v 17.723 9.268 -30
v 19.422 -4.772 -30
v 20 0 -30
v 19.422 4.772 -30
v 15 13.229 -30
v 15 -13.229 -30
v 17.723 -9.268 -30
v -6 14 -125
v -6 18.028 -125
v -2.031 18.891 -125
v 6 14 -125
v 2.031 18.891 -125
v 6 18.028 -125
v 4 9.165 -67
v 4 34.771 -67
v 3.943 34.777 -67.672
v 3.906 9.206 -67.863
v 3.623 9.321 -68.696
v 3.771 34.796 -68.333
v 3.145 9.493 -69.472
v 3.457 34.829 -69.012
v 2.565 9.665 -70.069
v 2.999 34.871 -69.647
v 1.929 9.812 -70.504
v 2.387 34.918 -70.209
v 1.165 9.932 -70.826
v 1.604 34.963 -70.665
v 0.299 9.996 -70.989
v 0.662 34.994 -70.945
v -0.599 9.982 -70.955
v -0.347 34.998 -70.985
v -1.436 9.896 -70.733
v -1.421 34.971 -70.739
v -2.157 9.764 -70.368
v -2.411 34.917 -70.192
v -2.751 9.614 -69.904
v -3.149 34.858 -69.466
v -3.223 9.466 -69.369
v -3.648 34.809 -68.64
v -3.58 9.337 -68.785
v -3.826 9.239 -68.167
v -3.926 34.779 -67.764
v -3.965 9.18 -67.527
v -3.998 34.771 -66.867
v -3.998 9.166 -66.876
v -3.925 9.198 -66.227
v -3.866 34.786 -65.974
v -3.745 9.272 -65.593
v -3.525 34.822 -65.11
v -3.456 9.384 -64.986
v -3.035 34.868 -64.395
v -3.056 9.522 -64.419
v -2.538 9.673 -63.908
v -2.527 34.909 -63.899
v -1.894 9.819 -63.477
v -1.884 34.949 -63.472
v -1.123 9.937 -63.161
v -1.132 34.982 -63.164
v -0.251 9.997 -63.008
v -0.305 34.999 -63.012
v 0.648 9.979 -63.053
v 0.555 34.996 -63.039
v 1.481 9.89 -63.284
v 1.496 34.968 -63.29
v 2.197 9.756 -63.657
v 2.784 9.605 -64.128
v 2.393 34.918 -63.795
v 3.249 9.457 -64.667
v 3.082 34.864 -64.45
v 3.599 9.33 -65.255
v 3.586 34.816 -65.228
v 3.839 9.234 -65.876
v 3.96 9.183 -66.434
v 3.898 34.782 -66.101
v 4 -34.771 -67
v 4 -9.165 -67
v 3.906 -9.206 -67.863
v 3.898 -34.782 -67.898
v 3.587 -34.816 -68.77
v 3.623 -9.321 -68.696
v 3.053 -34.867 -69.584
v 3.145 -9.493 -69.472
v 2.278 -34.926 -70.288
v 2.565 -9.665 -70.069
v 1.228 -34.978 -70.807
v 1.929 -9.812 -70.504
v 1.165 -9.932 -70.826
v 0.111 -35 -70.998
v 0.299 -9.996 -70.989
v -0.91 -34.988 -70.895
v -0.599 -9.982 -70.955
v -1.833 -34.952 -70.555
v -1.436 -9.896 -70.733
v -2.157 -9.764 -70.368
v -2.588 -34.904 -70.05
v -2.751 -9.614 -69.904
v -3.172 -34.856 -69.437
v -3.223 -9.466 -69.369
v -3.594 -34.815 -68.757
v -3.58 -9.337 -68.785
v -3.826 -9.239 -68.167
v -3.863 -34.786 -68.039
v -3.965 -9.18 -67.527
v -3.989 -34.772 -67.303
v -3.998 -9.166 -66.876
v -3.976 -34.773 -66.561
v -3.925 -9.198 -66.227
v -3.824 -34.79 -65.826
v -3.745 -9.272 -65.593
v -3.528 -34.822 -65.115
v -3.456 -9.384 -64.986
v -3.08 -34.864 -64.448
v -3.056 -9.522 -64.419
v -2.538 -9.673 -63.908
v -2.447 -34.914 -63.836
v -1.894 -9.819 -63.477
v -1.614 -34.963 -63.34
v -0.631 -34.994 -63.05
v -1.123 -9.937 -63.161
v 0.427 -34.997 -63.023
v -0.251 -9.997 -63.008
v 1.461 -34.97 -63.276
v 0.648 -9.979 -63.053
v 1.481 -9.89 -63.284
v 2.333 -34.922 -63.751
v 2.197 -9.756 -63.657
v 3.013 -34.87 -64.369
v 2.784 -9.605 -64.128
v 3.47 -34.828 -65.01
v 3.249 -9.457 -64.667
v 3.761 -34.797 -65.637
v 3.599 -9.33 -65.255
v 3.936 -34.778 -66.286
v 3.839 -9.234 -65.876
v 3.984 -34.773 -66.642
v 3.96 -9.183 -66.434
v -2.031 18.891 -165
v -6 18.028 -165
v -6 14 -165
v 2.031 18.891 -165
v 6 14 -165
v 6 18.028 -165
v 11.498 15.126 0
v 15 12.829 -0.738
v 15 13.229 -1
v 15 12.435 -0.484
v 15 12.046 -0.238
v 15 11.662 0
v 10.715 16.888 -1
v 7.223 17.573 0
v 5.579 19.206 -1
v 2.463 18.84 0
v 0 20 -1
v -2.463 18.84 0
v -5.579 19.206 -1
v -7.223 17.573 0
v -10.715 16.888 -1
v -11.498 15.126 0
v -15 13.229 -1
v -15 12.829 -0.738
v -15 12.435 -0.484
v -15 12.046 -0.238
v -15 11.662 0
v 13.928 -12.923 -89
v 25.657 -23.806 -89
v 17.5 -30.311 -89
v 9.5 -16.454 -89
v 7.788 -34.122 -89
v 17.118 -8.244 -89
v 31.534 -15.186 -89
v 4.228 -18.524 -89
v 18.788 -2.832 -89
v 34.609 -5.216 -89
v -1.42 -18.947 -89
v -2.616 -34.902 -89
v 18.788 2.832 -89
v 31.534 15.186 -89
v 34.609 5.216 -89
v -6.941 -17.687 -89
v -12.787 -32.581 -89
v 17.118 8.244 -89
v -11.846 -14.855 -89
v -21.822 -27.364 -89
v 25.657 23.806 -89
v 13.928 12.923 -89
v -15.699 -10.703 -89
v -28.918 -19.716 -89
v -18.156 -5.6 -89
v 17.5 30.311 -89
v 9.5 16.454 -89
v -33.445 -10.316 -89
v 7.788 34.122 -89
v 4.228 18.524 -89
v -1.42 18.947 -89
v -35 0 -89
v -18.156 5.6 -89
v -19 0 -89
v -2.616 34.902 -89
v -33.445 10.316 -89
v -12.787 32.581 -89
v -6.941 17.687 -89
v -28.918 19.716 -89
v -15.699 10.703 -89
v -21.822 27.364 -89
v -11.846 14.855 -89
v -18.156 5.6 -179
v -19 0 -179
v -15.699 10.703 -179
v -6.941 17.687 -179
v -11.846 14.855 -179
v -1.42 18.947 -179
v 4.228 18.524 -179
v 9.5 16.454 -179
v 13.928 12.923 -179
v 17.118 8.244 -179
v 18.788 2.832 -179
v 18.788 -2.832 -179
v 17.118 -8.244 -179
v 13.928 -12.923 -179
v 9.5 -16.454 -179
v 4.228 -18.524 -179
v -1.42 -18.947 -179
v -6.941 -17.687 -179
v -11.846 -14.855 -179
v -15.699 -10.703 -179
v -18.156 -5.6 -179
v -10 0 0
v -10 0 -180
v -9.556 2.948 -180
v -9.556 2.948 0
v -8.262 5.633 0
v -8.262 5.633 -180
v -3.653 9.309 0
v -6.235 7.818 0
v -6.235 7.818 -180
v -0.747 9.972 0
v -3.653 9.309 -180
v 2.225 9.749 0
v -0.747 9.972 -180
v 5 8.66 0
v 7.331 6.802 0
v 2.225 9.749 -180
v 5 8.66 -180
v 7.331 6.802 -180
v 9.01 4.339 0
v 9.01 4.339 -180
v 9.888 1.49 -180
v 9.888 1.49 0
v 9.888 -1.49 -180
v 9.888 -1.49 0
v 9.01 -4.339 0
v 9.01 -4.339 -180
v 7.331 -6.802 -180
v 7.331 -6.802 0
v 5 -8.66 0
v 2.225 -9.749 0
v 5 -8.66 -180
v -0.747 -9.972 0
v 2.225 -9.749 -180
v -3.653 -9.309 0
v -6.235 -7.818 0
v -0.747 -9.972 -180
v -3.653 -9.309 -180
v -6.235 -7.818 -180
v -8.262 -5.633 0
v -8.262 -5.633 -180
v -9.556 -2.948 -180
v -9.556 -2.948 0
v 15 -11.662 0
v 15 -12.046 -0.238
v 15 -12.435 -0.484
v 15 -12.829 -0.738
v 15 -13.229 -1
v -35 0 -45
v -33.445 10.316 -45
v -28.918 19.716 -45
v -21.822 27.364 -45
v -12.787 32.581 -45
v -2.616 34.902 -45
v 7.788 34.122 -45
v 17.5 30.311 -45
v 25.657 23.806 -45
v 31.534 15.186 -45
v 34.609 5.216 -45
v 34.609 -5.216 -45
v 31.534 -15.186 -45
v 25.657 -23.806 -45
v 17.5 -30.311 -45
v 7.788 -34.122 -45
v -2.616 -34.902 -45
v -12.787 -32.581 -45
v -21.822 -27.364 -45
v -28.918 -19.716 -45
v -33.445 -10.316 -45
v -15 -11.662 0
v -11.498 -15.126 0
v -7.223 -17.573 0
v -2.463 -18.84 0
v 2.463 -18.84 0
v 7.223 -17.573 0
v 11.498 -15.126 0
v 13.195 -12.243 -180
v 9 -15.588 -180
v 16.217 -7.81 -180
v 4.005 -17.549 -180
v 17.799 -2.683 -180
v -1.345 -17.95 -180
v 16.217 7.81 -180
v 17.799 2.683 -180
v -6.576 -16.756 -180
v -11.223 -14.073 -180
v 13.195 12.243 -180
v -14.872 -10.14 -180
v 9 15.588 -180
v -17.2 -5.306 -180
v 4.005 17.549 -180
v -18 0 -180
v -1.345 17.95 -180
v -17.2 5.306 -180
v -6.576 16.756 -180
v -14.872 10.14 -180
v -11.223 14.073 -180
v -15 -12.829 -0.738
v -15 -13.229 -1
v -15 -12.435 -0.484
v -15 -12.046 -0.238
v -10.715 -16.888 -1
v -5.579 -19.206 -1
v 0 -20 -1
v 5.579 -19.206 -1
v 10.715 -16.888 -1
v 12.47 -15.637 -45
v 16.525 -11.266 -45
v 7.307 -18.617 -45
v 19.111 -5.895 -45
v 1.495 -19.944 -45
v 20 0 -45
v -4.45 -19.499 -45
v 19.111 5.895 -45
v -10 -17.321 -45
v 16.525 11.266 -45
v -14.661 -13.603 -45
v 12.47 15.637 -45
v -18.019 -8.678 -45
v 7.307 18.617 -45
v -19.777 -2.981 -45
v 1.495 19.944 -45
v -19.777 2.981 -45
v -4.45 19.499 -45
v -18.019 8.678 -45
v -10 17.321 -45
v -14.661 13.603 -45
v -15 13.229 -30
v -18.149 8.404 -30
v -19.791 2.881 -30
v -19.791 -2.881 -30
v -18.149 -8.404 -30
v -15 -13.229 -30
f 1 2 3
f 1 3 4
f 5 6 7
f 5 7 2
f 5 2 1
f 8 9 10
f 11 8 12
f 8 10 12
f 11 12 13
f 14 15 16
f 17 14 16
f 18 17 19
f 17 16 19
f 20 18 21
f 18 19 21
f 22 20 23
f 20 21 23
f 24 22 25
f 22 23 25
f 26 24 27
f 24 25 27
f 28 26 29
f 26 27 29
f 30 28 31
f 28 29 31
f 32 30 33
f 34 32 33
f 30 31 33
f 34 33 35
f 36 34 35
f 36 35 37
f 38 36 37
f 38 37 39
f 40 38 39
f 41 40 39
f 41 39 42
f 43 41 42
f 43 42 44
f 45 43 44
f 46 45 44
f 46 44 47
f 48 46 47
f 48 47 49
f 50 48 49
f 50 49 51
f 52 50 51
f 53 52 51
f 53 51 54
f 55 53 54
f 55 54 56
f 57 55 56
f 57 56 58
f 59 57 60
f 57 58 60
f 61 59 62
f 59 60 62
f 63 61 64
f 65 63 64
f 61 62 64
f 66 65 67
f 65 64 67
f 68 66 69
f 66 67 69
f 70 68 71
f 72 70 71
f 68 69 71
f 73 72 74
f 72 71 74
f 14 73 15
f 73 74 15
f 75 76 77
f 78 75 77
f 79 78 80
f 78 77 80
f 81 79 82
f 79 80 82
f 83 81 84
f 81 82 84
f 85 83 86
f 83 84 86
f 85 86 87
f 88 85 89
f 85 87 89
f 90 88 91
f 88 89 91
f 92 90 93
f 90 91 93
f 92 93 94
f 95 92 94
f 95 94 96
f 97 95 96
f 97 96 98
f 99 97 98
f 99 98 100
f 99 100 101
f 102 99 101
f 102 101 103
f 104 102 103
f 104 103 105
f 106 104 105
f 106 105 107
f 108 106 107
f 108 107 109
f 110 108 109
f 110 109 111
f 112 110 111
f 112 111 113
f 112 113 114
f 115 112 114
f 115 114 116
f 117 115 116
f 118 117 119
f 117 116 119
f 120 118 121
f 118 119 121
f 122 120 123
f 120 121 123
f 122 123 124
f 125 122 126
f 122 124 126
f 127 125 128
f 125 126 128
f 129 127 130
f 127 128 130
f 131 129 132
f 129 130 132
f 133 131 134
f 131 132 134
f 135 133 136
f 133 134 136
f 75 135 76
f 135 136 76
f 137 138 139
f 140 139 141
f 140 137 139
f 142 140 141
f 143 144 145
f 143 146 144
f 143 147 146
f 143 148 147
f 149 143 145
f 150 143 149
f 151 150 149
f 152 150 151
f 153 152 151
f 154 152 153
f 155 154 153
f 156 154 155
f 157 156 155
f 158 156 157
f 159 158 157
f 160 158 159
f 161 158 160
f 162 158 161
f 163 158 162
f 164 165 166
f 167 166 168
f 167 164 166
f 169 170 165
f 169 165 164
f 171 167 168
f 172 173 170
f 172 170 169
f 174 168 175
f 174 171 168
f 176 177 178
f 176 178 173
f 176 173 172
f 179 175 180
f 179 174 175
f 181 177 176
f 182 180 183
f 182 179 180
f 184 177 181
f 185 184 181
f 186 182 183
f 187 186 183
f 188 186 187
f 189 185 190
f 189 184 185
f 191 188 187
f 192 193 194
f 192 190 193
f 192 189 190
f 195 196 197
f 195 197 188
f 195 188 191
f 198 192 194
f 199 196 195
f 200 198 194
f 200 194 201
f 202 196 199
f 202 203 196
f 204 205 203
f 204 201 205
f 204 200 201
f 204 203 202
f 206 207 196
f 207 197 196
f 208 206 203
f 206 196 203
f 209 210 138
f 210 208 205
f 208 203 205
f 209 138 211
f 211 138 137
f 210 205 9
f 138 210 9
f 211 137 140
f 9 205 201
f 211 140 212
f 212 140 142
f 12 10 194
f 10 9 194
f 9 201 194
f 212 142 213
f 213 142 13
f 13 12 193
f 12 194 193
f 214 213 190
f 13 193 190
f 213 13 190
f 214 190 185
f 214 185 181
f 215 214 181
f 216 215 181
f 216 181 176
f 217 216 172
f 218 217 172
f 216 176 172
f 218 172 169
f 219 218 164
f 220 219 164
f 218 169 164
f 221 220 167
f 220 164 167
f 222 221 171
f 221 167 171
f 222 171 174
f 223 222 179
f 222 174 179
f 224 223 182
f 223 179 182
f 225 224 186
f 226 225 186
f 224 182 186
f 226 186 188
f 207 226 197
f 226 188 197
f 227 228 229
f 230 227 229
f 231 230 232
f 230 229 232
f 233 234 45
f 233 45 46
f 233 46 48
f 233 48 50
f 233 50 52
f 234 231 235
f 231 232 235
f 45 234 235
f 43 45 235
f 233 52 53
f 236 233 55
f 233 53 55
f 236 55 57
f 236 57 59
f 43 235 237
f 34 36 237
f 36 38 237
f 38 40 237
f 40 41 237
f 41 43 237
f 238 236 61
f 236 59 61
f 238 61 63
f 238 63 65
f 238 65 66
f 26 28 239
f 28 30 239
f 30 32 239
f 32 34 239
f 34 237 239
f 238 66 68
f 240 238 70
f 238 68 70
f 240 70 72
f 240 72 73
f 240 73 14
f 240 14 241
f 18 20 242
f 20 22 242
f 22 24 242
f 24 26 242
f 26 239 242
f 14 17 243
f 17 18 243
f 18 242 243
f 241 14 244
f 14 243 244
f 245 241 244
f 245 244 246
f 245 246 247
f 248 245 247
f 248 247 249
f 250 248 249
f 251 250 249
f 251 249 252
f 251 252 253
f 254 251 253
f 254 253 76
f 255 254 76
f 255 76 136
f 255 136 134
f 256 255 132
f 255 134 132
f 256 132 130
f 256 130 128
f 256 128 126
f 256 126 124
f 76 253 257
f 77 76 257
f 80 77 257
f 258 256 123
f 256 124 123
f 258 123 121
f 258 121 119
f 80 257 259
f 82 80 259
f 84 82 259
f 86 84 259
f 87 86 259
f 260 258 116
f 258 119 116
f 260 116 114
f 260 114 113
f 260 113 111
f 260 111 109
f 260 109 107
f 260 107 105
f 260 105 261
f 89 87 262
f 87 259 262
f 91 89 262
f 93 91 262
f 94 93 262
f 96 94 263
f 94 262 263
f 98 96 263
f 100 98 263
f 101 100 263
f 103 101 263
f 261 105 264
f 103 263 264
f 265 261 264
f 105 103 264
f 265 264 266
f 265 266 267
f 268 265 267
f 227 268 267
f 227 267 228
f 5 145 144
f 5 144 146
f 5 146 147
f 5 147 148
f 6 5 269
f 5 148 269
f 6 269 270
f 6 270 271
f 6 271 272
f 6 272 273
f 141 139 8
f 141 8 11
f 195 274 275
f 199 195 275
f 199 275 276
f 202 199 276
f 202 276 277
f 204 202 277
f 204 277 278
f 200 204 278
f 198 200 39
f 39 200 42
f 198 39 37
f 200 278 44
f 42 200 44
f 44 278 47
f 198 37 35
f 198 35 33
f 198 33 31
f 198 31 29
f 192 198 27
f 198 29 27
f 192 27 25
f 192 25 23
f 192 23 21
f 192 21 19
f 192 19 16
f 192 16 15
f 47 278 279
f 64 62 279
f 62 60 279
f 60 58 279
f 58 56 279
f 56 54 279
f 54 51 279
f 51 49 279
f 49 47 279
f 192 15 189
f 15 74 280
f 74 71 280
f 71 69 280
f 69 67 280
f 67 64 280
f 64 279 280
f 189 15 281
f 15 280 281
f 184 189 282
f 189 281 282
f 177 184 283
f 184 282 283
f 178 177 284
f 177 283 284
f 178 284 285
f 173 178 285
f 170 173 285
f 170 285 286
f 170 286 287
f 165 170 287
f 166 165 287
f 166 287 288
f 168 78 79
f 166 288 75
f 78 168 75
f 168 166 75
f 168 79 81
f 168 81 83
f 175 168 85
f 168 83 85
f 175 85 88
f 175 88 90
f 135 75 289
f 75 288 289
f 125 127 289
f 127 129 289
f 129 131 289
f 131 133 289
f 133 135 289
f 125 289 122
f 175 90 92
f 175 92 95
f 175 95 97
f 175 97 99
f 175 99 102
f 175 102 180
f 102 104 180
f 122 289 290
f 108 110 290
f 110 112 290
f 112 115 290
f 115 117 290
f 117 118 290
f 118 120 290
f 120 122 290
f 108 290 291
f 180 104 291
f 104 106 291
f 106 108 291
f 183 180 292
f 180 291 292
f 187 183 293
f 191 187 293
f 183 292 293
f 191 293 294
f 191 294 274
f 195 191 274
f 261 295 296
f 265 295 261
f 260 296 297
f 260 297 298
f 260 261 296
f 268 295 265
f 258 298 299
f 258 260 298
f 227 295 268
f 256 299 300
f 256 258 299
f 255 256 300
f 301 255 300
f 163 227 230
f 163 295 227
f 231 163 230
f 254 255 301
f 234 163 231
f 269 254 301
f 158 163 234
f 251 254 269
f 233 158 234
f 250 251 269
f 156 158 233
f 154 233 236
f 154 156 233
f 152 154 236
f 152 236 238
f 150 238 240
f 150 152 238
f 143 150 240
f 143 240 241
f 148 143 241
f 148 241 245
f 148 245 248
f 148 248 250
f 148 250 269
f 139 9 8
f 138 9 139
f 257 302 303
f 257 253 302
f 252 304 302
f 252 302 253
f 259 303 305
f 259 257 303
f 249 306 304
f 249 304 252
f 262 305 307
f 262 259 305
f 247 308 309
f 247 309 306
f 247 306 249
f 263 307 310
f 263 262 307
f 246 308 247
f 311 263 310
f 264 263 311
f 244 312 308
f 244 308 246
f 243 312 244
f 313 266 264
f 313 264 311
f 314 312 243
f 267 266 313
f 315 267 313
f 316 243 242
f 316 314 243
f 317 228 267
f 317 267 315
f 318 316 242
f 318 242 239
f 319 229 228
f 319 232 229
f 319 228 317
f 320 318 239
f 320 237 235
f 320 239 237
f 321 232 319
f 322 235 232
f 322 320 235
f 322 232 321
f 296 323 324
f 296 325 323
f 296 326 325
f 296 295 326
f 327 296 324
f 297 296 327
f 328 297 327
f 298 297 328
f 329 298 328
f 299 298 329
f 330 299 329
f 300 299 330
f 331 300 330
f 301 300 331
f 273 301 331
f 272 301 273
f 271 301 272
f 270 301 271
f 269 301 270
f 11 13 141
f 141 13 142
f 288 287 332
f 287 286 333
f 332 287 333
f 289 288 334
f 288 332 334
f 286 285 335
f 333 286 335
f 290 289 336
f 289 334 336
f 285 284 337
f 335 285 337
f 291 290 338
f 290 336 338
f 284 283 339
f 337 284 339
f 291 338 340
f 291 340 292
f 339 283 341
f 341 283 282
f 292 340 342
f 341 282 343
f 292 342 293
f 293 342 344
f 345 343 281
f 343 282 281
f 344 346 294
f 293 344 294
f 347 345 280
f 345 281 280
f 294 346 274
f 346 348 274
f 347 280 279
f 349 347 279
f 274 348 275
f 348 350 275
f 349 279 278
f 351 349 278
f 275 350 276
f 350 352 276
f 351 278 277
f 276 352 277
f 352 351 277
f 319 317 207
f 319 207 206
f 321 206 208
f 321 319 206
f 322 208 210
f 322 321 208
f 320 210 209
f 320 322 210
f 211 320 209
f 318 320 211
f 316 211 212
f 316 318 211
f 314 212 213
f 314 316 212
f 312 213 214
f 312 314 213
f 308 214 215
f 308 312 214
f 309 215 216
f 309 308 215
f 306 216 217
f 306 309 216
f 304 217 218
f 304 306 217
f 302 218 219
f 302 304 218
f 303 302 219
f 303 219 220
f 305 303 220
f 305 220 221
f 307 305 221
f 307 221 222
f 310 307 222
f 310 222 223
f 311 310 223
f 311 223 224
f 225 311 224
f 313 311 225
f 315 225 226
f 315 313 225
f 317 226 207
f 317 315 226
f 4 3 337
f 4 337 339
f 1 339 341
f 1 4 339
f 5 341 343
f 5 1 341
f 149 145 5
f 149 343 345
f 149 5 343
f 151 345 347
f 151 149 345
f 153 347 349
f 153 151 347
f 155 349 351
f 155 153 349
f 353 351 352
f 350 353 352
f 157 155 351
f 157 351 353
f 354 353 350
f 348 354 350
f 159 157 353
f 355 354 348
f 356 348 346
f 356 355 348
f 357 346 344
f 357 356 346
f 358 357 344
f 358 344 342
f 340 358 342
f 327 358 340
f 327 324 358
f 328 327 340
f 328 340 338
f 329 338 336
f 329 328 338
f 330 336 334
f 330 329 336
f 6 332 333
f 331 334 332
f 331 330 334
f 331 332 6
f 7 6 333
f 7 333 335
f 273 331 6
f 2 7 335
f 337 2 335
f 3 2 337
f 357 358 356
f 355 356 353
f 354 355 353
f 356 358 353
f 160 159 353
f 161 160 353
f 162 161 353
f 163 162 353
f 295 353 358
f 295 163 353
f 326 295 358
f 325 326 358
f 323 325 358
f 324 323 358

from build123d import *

# Parameters (mm, degrees)
SKETCH_1_R          = 20
EXTRUDE_1_DEPTH     = 45
SKETCH_3_R          = 35
EXTRUDE_2_DEPTH     = 44
SKETCH_4_R          = 19
EXTRUDE_3_DEPTH     = 91
SKETCH_5_R          = 4
CUT_EXTRUDE_1_DEPTH = 91
SKETCH_6_R          = 10
CUT_EXTRUDE_2_DEPTH = 180
CUT_EXTRUDE_3_DEPTH = 30
CHAMFER_1_SIZE      = 1
SKETCH_8_W          = 12
SKETCH_8_H          = 40
CUT_EXTRUDE_4_DEPTH = 5


with BuildPart() as part:
    # Эскиз1 → Бобышка-Вытянуть1 (new body)
    with BuildSketch(Plane.XY):
        Circle(SKETCH_1_R)
    extrude(amount=-EXTRUDE_1_DEPTH)

    # Эскиз3 → Бобышка-Вытянуть2 (add)
    with BuildSketch(Plane(origin=(0, 0, -45), x_dir=(-1, 0, 0), z_dir=(0, 0, -1))):
        Circle(SKETCH_3_R)
    extrude(amount=EXTRUDE_2_DEPTH)

    # Эскиз4 → Бобышка-Вытянуть3 (add)
    with BuildSketch(Plane(origin=(0, 0, -89), x_dir=(-1, 0, 0), z_dir=(0, 0, -1))):
        Circle(SKETCH_4_R)
    extrude(amount=EXTRUDE_3_DEPTH)

    # Эскиз5 → Вырез-Вытянуть1 (cut)
    with BuildSketch(Plane(origin=(0, 35, 0), x_dir=(1, 0, 0), z_dir=(0, 1, 0))):
        with Locations((0, 67)):
            Circle(SKETCH_5_R)
    extrude(amount=-CUT_EXTRUDE_1_DEPTH, mode=Mode.SUBTRACT)

    # Эскиз6 → Вырез-Вытянуть2 (cut)
    with BuildSketch(Plane(origin=(0, 0, -180), x_dir=(-1, 0, 0), z_dir=(0, 0, -1))):
        Circle(SKETCH_6_R)
    extrude(amount=-CUT_EXTRUDE_2_DEPTH, mode=Mode.SUBTRACT)

    # Эскиз7 → Вырез-Вытянуть3 (cut)
    with BuildSketch(Plane.XY):
        with BuildLine():
            Line((-15, 13.228756555), (-15, -13.228756555))
            ThreePointArc((-15, -13.228756555), (-20, 0), (-15, 13.228756555))
        make_face()
        with BuildLine():
            Line((15, 13.228756555), (15, -13.228756555))
            ThreePointArc((15, -13.228756555), (20, 0), (15, 13.228756555))
        make_face()
    extrude(amount=-CUT_EXTRUDE_3_DEPTH, mode=Mode.SUBTRACT)

    # Фаска1
    chamfer_1_edges = [part.edges().sort_by_distance(p)[0] for p in [
        (19, 0, -180),
        (0, 20, 0),
        (0, -20, 0),
    ]]
    chamfer(chamfer_1_edges, length=CHAMFER_1_SIZE)

    # Эскиз8 → Вырез-Вытянуть4 (cut)
    with BuildSketch(Plane(origin=(0, 19, 0), x_dir=(1, 0, 0), z_dir=(0, 1, 0))):
        with Locations((0, 145)):
            Rectangle(SKETCH_8_W, SKETCH_8_H)
    extrude(amount=-CUT_EXTRUDE_4_DEPTH, mode=Mode.SUBTRACT)


solid = part.part
